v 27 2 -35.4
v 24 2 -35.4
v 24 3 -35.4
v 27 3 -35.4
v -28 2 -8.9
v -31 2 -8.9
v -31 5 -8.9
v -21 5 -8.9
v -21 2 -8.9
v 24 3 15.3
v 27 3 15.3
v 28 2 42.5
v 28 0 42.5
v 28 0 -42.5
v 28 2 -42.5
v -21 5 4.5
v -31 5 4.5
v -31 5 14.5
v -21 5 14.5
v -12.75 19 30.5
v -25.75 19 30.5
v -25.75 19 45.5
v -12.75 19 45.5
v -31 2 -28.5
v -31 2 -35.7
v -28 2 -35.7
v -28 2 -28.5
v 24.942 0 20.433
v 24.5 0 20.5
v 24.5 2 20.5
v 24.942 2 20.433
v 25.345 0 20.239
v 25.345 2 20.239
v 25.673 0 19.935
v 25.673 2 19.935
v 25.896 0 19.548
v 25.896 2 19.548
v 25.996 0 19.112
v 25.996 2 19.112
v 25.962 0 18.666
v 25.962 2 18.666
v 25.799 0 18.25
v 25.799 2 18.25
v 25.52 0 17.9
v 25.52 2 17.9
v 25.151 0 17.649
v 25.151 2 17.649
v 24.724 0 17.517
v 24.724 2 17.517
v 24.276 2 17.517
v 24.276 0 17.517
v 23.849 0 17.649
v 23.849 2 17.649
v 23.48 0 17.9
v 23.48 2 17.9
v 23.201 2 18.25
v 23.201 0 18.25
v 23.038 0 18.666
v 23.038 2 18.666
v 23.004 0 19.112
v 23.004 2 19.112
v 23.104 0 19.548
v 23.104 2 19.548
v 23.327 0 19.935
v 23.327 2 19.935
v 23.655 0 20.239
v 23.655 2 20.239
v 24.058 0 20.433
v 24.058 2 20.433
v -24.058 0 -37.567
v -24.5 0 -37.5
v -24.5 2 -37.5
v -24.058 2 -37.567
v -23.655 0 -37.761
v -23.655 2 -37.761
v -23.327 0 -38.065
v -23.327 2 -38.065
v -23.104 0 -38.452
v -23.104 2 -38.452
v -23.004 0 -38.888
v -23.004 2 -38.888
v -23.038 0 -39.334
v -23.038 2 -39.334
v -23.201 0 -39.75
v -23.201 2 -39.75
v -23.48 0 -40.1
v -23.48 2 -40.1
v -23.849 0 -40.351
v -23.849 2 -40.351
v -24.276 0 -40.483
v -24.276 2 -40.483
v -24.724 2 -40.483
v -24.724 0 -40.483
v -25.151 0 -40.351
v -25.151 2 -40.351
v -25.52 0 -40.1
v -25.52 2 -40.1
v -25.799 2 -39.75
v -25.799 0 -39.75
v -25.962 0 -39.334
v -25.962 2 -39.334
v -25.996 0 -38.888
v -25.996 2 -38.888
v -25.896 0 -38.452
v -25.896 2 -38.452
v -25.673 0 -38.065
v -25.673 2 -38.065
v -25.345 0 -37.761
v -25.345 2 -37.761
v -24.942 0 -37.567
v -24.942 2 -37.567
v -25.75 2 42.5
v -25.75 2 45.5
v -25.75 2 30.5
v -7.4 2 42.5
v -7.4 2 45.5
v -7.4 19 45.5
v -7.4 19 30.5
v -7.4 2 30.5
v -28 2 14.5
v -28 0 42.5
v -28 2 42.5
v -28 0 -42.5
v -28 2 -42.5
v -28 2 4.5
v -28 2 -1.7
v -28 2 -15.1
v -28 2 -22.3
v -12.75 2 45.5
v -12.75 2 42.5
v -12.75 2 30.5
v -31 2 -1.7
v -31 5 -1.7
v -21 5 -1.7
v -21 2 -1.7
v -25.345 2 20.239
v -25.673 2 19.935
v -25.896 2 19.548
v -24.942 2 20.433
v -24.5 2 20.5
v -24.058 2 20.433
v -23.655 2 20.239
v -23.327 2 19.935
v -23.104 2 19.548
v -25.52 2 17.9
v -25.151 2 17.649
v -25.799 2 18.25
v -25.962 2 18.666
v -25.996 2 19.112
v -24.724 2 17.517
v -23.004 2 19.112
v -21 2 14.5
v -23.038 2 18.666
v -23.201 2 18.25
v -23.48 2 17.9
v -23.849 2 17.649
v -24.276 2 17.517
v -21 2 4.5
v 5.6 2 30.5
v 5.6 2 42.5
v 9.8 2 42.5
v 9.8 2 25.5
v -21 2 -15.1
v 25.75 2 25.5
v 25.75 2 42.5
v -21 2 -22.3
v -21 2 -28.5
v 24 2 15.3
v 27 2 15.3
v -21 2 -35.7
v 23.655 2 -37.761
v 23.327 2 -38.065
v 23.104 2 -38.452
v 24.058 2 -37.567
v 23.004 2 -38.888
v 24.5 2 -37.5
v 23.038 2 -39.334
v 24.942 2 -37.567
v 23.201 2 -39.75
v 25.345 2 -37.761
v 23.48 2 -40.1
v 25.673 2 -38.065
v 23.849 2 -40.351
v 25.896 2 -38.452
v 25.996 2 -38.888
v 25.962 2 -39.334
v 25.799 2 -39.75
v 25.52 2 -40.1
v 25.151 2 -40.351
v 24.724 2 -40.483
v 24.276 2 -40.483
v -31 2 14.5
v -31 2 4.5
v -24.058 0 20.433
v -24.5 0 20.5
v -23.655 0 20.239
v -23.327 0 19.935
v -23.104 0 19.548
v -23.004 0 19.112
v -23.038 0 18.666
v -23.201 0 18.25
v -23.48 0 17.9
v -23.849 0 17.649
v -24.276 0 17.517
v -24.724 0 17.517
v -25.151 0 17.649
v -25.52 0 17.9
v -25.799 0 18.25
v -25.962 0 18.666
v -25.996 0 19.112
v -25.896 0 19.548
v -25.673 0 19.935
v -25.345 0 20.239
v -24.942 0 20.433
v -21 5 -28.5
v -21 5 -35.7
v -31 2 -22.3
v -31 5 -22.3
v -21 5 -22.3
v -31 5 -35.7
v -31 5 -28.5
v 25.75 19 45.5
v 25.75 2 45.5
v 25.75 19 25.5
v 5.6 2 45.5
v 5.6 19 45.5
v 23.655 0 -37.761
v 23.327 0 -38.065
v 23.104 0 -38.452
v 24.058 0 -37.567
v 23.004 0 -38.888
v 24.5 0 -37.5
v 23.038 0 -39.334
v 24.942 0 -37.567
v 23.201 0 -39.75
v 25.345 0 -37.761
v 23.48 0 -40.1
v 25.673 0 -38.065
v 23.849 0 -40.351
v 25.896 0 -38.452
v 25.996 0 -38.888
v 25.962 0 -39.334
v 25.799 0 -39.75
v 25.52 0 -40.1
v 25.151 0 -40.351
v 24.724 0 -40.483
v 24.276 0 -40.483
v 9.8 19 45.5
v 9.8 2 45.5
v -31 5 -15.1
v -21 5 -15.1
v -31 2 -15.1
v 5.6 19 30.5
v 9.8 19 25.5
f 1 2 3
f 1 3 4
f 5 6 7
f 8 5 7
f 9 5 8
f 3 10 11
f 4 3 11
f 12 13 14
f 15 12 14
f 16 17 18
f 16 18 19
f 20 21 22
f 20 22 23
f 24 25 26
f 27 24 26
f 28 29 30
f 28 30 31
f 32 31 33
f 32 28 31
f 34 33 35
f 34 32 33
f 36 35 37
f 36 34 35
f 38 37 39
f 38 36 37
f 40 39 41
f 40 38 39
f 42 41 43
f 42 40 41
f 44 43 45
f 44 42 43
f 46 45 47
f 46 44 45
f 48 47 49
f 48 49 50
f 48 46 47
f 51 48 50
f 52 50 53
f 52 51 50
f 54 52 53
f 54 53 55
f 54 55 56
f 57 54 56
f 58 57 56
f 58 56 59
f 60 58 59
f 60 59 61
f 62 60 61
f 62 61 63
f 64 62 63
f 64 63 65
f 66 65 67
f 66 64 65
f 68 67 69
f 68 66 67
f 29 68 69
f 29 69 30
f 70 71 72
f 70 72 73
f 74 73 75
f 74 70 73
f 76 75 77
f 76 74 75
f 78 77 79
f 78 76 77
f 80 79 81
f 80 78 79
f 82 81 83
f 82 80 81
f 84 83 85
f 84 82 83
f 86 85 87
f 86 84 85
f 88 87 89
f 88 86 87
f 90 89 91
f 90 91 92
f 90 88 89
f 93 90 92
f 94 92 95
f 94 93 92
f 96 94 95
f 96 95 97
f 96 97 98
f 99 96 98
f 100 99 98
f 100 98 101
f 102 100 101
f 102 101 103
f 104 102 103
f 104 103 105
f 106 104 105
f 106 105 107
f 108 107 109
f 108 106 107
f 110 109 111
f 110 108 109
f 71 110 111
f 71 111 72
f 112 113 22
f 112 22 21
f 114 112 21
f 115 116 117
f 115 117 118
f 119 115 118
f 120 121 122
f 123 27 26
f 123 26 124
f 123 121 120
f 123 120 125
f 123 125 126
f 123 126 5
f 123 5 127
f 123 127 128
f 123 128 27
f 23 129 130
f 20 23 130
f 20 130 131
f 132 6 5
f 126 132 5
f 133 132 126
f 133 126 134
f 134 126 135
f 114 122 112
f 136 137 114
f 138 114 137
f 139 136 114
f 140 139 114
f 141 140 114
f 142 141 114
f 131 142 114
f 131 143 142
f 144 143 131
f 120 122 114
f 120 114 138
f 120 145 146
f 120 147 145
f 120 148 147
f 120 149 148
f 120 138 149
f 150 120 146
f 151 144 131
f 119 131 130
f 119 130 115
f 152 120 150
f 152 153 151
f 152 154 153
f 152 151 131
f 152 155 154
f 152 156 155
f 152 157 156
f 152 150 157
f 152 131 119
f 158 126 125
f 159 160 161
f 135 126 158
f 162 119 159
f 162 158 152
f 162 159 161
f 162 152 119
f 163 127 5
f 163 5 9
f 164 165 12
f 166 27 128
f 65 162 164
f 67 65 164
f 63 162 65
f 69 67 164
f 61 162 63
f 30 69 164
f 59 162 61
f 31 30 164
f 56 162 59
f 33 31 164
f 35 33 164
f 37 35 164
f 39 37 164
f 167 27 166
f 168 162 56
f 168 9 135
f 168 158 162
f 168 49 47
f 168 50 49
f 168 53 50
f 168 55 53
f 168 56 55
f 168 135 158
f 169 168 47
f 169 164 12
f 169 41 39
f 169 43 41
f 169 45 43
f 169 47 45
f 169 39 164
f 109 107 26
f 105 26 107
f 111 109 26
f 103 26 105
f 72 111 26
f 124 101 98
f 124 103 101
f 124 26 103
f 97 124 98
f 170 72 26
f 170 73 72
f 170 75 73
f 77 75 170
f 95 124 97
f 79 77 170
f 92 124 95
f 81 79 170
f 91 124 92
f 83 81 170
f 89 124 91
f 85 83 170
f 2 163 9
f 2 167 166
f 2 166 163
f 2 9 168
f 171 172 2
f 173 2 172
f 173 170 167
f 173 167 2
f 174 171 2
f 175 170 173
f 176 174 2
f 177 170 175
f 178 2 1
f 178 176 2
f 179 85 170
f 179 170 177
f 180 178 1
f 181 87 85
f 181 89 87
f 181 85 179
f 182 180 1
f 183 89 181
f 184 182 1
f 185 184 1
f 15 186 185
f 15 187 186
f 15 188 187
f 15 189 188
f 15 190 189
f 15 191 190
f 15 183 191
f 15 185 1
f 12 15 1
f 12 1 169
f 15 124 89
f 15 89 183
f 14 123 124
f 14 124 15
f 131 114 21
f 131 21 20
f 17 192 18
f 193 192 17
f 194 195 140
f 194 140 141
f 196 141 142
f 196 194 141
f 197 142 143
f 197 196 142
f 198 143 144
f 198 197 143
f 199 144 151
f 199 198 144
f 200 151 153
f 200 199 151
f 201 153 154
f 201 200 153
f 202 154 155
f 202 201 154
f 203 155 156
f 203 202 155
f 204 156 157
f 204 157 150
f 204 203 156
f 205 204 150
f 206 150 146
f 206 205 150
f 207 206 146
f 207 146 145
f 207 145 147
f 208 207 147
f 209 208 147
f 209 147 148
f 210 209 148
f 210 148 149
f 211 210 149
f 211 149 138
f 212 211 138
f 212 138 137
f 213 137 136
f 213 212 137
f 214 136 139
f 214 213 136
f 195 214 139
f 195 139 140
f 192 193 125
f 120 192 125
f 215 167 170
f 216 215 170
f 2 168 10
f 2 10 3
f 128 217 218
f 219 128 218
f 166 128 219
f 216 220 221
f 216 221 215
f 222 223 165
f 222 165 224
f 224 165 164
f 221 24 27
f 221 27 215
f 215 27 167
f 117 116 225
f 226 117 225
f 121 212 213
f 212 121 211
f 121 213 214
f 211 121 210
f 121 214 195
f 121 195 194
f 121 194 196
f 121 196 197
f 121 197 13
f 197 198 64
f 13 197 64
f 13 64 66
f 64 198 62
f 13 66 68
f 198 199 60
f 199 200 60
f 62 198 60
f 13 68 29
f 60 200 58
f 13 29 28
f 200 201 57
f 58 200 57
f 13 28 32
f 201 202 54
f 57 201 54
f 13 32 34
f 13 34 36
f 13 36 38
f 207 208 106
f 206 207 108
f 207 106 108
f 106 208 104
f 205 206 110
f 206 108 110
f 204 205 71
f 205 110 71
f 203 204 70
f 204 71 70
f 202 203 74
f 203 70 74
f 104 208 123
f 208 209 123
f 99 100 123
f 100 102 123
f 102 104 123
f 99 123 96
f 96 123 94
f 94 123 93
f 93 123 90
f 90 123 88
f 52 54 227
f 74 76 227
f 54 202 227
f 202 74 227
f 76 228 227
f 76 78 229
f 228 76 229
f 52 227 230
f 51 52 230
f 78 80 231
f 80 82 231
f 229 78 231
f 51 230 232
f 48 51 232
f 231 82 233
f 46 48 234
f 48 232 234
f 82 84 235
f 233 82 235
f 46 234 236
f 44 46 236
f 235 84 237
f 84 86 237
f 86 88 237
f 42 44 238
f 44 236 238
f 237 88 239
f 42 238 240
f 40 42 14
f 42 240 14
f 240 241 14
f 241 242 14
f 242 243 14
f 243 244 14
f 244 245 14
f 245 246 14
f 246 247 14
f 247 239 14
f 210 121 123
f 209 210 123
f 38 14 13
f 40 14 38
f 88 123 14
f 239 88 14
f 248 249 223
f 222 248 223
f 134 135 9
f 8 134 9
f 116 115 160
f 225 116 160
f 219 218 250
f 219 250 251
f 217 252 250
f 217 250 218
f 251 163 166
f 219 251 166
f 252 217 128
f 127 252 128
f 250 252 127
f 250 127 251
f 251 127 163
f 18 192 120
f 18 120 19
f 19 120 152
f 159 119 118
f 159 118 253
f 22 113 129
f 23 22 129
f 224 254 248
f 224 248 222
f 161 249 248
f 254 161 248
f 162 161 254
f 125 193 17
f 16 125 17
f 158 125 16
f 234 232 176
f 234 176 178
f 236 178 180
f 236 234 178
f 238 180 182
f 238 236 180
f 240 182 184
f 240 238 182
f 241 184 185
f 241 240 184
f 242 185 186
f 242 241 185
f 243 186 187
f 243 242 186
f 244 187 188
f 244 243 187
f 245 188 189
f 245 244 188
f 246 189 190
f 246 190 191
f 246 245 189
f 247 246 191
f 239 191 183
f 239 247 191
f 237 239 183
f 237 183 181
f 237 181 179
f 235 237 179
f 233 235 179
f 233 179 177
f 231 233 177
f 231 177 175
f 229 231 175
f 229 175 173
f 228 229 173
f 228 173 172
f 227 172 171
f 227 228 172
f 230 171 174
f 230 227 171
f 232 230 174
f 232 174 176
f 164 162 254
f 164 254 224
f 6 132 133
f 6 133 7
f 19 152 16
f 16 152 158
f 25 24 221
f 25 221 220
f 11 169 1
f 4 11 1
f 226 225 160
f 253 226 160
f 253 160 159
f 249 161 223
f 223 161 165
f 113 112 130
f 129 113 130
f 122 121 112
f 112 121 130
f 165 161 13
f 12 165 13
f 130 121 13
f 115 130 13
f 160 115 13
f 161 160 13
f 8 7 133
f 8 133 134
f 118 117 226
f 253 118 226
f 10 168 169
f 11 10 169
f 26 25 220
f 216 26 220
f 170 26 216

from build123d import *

# Parameters (mm, degrees)
SKETCH1_W           = 56
SKETCH1_H           = 85
SKETCH1_R           = 1.5
BOSS_EXTRUDE1_DEPTH = 2
SKETCH2_W           = 3
SKETCH2_H           = 50.7
BOSS_EXTRUDE2_DEPTH = 1
SKETCH3_W           = 13
SKETCH3_H           = 15
SKETCH3_W_2         = 15.95
SKETCH3_H_2         = 20
BOSS_EXTRUDE3_DEPTH = 17
SKETCH4_W           = 10
SKETCH4_H           = 7.2
SKETCH4_H_2         = 10
BOSS_EXTRUDE4_DEPTH = 3


with BuildPart() as part:
    # Sketch1 → Boss-Extrude1 (new body)
    with BuildSketch(Plane(origin=(0, 0, 0), x_dir=(1, 0, 0), z_dir=(0, 1, 0))):
        Rectangle(SKETCH1_W, SKETCH1_H)
        with Locations(Location((-24.5, 39, 0), (0, 0, 270))):
            Circle(SKETCH1_R, mode=Mode.SUBTRACT)
        with Locations(Location((24.5, 39, 0), (0, 0, 270))):
            Circle(SKETCH1_R, mode=Mode.SUBTRACT)
        with Locations(Location((-24.5, -19, 0), (0, 0, 270))):
            Circle(SKETCH1_R, mode=Mode.SUBTRACT)
        with Locations(Location((24.5, -19, 0), (0, 0, 270))):
            Circle(SKETCH1_R, mode=Mode.SUBTRACT)
    extrude(amount=BOSS_EXTRUDE1_DEPTH)

    # Sketch2 → Boss-Extrude2 (add)
    with BuildSketch(Plane(origin=(0, 2, 0), x_dir=(1, 0, 0), z_dir=(0, 1, 0))):
        with Locations((25.5, 10.05)):
            Rectangle(SKETCH2_W, SKETCH2_H)
    extrude(amount=BOSS_EXTRUDE2_DEPTH)

    # Sketch3 → Boss-Extrude3 (add)
    with BuildSketch(Plane(origin=(0, 2, 0), x_dir=(1, 0, 0), z_dir=(0, 1, 0))):
        with Locations((-19.25, -38)):
            Rectangle(SKETCH3_W, SKETCH3_H)
        with Locations((-0.9, -38)):
            Rectangle(SKETCH3_W, SKETCH3_H)
        with Locations((17.775, -35.5)):
            Rectangle(SKETCH3_W_2, SKETCH3_H_2)
    extrude(amount=BOSS_EXTRUDE3_DEPTH)

    # Sketch4 → Boss-Extrude4 (add)
    with BuildSketch(Plane(origin=(0, 2, 0), x_dir=(1, 0, 0), z_dir=(0, 1, 0))):
        with Locations((-26, 32.1)):
            Rectangle(SKETCH4_W, SKETCH4_H)
        with Locations((-26, 5.3)):
            Rectangle(SKETCH4_W, SKETCH4_H)
        with Locations((-26, -9.5)):
            Rectangle(SKETCH4_W, SKETCH4_H_2)
        with Locations((-26, 18.7)):
            Rectangle(SKETCH4_W, SKETCH4_H)
    extrude(amount=BOSS_EXTRUDE4_DEPTH)


solid = part.part
